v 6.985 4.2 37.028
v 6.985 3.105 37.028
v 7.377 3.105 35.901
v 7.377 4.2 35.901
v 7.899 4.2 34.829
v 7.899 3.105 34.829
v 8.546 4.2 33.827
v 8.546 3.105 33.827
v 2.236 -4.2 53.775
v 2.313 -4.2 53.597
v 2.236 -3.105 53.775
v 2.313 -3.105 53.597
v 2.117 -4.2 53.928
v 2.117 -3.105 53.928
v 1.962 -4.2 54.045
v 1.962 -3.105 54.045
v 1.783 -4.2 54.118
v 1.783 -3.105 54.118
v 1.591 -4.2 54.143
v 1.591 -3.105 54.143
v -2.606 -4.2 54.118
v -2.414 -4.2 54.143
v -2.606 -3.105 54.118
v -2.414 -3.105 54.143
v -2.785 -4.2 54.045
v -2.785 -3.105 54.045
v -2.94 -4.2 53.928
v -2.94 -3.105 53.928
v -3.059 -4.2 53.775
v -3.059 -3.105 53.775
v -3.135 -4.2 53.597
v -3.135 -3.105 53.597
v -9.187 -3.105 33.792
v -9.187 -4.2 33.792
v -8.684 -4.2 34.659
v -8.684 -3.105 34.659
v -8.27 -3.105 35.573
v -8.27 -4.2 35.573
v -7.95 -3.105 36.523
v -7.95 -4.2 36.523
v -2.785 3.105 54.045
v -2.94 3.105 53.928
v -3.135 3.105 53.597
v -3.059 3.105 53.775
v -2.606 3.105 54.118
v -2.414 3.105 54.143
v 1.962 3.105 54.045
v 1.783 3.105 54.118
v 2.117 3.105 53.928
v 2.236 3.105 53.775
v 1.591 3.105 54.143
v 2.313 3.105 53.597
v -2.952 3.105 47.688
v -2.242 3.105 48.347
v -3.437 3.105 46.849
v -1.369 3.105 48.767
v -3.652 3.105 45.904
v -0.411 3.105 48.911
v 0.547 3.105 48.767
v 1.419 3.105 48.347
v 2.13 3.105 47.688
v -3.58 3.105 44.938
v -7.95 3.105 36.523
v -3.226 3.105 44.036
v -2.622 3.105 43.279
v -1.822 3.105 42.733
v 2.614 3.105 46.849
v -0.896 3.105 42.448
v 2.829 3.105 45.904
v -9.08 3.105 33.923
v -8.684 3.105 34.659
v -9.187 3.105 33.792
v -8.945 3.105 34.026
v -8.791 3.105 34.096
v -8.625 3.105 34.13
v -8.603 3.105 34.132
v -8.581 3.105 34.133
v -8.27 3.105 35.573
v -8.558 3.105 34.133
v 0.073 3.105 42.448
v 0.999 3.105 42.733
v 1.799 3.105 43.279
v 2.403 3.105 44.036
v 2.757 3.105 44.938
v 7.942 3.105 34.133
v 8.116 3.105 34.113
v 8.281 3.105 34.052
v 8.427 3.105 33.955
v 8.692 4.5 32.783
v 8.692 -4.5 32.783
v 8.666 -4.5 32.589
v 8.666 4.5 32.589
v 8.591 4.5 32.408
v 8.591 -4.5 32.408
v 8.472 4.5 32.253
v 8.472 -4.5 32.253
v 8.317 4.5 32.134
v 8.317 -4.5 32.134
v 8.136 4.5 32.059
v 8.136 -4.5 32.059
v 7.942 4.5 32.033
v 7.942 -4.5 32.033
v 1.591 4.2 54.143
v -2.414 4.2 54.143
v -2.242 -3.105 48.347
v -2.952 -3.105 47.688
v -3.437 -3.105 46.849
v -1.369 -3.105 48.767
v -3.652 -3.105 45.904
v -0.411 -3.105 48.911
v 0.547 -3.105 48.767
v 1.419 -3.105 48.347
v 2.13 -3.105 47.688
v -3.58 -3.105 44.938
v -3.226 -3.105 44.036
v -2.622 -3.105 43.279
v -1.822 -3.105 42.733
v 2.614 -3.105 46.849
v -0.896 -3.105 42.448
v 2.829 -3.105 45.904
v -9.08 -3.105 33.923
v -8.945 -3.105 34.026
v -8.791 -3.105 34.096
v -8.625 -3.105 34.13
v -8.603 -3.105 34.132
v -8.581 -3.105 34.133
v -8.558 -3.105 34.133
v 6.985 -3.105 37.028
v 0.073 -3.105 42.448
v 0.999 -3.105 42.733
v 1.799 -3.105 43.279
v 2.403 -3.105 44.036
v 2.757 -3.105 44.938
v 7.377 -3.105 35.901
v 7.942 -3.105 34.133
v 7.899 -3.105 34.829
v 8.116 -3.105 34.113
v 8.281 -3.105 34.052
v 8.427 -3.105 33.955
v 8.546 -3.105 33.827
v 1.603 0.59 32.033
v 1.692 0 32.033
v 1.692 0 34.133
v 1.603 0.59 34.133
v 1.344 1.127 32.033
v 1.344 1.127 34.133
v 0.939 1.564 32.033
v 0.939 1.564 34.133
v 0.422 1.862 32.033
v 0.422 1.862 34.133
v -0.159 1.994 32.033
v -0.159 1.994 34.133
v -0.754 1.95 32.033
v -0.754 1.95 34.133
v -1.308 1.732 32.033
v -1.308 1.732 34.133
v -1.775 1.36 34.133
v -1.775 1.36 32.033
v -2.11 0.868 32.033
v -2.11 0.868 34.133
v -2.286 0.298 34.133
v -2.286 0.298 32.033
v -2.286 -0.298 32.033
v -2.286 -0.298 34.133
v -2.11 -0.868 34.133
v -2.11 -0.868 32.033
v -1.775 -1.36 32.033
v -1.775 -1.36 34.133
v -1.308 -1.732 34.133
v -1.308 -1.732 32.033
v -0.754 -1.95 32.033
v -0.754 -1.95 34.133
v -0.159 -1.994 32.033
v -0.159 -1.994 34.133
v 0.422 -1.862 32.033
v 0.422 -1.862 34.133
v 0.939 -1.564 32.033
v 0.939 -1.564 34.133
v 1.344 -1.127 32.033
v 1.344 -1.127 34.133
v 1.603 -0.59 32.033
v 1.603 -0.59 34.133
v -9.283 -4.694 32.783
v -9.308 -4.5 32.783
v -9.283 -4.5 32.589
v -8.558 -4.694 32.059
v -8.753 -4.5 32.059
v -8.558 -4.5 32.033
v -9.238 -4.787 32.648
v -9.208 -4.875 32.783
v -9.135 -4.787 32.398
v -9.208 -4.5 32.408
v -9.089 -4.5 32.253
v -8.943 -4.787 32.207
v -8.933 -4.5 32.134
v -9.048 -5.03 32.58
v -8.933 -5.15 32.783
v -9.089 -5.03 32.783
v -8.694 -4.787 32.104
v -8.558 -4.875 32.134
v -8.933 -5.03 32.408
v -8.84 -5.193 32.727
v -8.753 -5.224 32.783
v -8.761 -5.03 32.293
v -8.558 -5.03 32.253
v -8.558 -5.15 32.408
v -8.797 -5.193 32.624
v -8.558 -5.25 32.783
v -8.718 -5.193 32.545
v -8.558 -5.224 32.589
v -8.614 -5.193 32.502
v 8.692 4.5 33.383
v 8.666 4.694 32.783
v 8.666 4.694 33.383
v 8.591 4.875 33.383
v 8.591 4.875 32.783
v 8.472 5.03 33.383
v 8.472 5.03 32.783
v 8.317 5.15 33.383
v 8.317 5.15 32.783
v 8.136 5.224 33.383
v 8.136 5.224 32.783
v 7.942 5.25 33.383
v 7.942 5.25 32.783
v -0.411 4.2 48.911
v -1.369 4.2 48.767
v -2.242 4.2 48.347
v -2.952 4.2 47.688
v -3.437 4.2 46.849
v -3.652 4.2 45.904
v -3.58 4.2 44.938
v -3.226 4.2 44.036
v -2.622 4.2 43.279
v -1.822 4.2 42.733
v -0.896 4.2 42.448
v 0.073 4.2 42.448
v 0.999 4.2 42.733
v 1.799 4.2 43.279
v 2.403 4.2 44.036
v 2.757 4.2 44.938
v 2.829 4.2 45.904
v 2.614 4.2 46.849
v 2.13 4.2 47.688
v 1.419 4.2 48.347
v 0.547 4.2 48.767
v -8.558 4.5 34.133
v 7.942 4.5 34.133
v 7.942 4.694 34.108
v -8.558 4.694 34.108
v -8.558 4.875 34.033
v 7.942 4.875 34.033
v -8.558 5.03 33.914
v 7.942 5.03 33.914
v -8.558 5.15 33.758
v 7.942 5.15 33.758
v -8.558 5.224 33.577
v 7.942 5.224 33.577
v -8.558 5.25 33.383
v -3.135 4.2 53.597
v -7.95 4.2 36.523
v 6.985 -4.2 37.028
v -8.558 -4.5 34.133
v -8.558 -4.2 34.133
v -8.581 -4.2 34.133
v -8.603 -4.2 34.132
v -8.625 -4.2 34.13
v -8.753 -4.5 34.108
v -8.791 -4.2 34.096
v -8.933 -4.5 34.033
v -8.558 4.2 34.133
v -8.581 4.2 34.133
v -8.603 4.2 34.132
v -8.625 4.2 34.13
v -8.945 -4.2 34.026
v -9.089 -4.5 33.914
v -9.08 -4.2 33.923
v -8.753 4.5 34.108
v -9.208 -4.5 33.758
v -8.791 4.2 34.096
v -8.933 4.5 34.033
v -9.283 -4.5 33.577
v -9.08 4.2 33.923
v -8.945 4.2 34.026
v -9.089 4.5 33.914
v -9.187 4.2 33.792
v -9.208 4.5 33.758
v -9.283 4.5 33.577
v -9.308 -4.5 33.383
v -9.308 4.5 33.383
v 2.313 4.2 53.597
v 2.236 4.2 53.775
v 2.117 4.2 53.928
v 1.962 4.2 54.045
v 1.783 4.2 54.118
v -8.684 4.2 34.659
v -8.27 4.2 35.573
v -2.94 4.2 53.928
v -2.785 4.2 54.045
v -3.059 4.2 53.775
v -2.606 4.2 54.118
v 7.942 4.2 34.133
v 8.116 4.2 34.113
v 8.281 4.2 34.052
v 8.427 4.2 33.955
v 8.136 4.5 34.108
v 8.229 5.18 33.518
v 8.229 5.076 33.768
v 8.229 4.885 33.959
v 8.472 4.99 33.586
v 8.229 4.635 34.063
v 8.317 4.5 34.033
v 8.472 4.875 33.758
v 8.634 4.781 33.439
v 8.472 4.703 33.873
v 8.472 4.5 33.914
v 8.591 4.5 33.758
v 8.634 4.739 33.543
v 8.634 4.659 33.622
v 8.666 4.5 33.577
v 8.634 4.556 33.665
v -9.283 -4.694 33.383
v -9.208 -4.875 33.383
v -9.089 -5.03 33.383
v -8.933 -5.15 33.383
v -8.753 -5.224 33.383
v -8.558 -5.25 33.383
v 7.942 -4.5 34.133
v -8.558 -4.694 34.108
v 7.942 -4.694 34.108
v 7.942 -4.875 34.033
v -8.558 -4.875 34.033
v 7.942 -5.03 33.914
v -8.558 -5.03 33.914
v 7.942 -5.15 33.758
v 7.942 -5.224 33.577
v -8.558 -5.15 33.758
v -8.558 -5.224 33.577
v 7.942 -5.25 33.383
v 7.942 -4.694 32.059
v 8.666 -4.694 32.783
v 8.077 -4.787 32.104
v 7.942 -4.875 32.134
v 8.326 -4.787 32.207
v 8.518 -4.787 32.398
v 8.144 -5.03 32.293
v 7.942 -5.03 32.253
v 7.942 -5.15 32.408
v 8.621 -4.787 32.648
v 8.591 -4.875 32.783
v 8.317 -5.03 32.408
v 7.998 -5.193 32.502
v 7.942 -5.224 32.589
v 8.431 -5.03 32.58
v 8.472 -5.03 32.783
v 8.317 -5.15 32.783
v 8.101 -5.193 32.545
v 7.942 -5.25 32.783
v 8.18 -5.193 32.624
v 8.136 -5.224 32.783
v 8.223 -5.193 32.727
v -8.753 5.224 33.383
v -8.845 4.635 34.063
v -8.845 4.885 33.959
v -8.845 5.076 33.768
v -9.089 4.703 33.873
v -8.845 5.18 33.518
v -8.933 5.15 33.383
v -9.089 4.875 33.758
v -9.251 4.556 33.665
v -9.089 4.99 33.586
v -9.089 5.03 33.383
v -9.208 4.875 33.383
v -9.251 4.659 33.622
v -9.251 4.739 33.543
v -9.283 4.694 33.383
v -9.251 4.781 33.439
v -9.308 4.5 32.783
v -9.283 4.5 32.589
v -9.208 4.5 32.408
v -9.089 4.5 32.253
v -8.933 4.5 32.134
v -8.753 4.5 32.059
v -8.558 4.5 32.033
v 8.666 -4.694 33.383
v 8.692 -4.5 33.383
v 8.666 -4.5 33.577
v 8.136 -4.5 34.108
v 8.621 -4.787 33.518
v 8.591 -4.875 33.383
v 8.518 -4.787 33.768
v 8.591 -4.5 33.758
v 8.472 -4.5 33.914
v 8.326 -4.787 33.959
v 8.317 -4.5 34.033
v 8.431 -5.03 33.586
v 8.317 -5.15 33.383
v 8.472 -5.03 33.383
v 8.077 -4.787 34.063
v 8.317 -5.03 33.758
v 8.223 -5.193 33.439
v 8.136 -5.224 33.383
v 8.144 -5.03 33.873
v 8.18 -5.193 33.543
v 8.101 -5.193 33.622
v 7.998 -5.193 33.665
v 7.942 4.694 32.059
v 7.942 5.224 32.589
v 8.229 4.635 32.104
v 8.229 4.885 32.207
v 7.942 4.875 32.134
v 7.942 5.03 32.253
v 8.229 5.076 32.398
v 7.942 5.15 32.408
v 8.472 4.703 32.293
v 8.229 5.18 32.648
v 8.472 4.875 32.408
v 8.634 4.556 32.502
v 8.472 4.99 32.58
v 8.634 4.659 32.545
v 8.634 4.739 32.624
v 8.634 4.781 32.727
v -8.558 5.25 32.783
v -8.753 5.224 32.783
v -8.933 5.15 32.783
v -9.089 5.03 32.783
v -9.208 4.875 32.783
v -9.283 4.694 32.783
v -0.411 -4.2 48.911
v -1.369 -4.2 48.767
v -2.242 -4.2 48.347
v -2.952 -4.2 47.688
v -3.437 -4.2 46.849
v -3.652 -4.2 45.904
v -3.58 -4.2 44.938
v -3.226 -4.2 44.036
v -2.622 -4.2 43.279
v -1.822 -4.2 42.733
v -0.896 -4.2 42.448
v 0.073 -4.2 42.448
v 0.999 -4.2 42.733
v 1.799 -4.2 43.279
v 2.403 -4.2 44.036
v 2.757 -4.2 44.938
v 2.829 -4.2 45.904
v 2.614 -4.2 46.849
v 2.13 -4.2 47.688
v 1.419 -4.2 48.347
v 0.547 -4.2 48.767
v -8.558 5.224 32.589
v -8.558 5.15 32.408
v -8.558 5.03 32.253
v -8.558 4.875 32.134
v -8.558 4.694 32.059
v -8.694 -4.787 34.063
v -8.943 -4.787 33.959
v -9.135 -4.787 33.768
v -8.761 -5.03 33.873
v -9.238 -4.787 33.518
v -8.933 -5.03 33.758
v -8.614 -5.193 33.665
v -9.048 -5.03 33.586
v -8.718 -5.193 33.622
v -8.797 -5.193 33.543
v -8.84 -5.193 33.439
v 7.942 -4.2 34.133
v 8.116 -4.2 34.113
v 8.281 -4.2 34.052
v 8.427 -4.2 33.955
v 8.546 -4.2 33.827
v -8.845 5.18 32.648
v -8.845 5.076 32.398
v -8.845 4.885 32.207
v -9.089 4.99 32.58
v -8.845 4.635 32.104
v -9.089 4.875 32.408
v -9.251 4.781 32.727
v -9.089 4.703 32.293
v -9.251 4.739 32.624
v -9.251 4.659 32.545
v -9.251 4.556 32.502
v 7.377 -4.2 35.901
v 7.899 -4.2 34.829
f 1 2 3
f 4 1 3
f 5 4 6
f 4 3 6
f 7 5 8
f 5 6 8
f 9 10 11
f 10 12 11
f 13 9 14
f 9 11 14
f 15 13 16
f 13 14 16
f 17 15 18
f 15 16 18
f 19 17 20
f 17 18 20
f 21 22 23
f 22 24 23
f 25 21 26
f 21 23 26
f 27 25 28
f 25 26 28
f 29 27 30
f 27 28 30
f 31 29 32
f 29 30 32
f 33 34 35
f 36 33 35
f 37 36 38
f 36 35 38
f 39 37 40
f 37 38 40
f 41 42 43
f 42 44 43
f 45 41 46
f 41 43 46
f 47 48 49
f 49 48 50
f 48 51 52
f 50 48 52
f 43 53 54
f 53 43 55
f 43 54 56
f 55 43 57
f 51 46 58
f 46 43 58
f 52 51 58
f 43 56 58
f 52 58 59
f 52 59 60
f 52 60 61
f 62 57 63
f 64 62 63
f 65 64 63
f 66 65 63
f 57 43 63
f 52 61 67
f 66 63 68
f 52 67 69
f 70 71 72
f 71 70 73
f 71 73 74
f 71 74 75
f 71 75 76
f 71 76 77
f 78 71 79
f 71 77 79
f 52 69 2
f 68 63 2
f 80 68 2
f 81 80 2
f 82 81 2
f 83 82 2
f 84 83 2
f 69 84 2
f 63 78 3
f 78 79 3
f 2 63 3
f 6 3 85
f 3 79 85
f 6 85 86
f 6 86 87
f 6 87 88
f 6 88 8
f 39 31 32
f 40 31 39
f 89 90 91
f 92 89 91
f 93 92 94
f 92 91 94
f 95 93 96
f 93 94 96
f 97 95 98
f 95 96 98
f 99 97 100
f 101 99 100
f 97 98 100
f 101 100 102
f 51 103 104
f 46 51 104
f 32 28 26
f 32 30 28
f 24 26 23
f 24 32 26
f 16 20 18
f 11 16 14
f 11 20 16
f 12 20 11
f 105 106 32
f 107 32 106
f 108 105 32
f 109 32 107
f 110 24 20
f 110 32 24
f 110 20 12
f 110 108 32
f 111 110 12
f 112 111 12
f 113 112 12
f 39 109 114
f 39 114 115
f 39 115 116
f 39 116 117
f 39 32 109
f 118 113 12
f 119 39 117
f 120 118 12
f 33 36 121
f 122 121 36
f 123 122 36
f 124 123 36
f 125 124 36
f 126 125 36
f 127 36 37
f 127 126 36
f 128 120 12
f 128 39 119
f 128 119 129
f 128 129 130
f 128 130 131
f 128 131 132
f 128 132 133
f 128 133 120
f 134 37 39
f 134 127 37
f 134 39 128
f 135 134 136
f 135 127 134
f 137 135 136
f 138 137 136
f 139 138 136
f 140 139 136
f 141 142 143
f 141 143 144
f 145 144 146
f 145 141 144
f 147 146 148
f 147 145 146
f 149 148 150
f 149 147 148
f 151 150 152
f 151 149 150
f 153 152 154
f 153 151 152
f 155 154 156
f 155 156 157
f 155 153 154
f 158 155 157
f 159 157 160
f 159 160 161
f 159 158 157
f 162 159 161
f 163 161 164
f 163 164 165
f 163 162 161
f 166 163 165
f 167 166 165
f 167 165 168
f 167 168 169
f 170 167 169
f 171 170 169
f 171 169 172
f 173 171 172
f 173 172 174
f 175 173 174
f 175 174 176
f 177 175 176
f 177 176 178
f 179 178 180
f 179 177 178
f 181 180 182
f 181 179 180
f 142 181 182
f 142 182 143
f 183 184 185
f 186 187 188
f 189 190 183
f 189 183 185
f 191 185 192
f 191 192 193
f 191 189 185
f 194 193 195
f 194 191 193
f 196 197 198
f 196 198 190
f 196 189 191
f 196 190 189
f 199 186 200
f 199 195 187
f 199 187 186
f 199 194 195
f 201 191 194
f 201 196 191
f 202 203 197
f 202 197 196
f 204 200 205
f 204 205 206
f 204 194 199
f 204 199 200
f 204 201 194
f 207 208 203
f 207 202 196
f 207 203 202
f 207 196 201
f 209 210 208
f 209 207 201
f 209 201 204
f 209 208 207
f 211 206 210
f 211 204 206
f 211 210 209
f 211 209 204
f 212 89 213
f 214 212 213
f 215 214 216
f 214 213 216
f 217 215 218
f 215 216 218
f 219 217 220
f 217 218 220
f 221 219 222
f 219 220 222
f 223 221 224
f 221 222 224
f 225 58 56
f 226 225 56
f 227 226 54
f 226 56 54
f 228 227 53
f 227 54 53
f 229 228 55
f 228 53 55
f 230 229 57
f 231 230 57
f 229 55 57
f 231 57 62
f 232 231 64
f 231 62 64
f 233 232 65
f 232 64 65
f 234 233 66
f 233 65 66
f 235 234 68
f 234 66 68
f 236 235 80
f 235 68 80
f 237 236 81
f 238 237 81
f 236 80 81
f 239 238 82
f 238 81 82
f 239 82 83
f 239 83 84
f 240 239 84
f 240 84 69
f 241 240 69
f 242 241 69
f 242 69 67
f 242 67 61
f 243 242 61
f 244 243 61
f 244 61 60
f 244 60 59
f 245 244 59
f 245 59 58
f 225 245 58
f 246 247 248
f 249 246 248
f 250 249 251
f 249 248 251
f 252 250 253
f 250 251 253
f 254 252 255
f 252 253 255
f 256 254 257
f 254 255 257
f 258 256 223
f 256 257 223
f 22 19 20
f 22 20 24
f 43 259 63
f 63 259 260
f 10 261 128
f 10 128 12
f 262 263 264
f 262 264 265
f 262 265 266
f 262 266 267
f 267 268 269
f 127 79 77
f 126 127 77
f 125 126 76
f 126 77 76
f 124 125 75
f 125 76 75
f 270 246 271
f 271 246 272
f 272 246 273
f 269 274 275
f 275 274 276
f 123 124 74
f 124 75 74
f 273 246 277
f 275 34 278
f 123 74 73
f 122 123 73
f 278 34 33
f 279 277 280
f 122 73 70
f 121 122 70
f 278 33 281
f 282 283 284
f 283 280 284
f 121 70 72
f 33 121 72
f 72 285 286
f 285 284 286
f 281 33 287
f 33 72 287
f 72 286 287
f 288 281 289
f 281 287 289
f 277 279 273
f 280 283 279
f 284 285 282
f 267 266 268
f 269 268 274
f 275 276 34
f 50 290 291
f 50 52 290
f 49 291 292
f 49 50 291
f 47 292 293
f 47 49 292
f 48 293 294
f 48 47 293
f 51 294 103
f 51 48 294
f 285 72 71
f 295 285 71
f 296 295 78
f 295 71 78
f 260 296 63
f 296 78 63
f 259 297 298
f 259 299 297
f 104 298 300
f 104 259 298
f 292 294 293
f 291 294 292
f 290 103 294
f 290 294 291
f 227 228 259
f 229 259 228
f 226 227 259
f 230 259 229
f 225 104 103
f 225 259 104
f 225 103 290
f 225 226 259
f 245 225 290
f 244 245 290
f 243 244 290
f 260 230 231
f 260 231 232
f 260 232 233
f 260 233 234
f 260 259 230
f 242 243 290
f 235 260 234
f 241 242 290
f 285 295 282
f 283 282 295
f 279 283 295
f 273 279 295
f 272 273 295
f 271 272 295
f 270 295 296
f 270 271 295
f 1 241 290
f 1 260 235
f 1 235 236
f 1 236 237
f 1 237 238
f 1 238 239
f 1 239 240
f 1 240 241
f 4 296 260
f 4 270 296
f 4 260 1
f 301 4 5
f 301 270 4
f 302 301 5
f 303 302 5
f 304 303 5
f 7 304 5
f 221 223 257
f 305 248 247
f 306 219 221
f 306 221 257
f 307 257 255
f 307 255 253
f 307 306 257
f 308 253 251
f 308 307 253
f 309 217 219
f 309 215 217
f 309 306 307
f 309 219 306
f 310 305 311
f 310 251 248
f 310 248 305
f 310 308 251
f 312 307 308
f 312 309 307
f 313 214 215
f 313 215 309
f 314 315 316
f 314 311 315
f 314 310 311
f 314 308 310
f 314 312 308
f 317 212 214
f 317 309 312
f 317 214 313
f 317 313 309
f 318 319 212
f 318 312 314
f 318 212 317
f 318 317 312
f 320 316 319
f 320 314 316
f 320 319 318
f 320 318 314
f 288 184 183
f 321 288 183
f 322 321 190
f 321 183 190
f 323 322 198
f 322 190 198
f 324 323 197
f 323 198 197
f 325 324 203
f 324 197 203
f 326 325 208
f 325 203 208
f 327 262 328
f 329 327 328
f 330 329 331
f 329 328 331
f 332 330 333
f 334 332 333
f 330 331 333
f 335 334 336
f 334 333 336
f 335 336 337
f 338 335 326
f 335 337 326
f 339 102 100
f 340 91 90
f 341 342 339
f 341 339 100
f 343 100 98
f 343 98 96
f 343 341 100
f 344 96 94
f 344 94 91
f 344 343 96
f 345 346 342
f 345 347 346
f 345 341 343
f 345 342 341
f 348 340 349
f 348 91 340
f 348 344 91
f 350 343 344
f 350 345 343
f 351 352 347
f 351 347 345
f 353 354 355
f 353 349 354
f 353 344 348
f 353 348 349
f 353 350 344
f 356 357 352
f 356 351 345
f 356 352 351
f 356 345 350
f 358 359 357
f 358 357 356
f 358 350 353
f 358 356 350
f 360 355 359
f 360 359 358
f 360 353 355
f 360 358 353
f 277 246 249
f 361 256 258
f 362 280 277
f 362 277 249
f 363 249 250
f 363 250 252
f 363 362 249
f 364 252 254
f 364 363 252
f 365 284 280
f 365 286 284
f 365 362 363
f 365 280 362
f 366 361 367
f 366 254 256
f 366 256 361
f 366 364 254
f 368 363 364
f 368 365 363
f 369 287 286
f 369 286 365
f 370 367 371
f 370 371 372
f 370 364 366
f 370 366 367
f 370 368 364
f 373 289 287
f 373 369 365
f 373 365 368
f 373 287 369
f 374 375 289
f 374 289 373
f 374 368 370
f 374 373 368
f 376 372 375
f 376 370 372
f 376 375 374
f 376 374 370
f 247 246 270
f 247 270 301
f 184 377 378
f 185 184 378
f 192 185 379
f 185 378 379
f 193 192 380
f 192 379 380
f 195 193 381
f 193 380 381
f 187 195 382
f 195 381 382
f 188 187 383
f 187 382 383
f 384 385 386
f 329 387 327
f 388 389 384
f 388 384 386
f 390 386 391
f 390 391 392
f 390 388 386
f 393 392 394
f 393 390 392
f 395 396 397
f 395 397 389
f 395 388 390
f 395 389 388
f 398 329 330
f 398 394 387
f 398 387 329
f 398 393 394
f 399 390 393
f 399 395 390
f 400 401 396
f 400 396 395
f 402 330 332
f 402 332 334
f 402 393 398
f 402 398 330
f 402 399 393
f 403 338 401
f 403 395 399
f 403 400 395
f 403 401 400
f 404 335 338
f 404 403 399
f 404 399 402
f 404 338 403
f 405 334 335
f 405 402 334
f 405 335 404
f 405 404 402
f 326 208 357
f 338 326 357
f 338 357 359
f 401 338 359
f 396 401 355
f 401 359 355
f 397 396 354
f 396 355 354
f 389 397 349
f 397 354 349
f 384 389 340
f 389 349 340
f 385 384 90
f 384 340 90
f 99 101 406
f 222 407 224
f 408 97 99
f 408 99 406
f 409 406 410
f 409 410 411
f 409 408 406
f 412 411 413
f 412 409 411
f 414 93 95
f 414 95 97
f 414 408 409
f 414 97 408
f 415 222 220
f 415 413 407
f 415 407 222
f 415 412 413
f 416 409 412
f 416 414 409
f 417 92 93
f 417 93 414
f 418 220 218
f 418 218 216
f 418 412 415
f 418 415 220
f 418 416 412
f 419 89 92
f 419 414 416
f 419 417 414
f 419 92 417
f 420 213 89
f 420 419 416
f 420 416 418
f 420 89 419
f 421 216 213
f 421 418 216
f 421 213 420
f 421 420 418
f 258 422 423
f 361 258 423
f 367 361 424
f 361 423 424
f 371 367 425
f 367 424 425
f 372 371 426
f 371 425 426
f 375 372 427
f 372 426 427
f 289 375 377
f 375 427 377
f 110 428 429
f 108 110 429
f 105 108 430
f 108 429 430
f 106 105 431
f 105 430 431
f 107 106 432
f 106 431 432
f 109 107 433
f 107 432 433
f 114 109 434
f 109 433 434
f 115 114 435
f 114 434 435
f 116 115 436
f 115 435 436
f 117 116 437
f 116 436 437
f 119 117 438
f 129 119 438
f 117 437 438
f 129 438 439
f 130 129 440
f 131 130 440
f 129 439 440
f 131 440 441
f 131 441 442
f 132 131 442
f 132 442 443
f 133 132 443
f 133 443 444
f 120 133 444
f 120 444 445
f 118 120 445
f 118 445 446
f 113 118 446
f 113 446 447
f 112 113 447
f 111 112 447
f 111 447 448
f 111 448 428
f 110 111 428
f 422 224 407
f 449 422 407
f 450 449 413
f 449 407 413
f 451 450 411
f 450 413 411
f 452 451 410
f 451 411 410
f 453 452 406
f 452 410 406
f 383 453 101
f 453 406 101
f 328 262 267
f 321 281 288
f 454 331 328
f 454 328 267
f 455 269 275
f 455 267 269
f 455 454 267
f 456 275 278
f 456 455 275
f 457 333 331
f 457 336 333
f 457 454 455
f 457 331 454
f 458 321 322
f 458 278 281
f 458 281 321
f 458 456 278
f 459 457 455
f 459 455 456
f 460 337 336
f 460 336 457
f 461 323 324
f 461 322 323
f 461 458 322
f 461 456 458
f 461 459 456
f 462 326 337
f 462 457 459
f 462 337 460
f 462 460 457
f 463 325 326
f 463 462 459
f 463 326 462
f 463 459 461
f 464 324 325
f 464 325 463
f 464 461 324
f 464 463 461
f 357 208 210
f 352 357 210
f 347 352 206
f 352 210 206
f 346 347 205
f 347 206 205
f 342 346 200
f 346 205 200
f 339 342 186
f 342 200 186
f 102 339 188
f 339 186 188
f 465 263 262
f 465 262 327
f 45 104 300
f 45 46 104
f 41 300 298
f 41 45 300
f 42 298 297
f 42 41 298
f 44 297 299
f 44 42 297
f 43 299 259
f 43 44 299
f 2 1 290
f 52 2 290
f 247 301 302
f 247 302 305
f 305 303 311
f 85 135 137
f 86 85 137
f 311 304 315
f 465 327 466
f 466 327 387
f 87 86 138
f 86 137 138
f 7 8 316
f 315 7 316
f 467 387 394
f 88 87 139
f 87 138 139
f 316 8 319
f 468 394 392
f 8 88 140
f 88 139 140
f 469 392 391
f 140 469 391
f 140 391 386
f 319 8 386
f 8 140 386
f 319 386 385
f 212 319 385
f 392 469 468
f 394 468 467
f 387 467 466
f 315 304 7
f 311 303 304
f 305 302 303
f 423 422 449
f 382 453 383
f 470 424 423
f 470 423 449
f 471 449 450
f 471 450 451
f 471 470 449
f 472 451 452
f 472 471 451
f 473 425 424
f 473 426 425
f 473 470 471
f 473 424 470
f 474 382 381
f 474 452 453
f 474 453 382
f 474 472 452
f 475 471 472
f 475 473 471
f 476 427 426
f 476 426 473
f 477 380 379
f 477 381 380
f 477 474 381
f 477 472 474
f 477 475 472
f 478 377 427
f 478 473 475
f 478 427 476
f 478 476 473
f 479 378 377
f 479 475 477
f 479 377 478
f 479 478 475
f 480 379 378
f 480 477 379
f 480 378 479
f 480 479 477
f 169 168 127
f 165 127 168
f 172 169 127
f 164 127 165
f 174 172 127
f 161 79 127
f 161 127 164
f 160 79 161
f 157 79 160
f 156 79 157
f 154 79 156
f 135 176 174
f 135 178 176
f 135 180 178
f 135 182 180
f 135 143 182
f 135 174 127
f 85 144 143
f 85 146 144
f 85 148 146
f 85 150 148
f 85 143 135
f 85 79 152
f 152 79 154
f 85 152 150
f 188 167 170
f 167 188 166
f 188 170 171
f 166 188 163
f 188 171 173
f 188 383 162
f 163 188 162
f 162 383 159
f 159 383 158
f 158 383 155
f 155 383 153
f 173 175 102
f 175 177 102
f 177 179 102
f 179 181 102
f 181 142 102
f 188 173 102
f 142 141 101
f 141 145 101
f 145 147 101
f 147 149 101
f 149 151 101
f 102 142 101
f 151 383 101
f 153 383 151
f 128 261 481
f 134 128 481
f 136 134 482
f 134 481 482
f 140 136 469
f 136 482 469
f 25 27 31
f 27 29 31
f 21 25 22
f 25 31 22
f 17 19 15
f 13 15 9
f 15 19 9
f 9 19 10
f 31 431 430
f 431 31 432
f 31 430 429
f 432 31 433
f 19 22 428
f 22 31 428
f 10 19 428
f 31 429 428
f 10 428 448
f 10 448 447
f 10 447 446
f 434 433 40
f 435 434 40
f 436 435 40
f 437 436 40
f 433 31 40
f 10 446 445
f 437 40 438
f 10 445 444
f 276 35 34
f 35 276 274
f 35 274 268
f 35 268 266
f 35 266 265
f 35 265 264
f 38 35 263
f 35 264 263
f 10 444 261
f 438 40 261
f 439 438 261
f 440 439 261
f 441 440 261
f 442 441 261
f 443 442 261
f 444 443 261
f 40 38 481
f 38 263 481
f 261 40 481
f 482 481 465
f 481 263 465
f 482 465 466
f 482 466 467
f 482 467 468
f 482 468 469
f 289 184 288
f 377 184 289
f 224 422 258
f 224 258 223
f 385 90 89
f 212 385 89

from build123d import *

# Parameters (mm, degrees)
SKETCH1_W           = 120
SKETCH1_H           = 70
SKETCH1_R           = 13.333333333
BOSS_EXTRUDE1_DEPTH = 14
BOSS_EXTRUDE2_DEPTH = 7.3
SKETCH4_R           = 21.666666667
CUT_EXTRUDE1_DEPTH  = 172.159351628
FILLET1_R           = 5
FILLET2_R           = 5
SCALE1_SCALE        = 0.15
FILLET3_START       = -4.2
FILLET3_DEPTH       = 1.095
FILLET3_START_2     = 3.105
FILLET3_2_DEPTH     = 1.095


with BuildPart() as part:
    # Sketch1 → Boss-Extrude1 (new body)
    with BuildSketch(Plane.XY):
        Rectangle(SKETCH1_W, SKETCH1_H)
        Circle(SKETCH1_R, mode=Mode.SUBTRACT)
    extrude(amount=BOSS_EXTRUDE1_DEPTH)

    # Sketch3 → Boss-Extrude2 (add)
    with BuildSketch(Plane(origin=(0, -28, 0), x_dir=(-1, 0, 0), z_dir=(0, -1, 0))):
        Polygon((55.436544165, -14), (-54.063561803, -14), (-16.446396869, -147.399198267), (17.819379231, -147.399198267), align=None)
    boss_extrude2 = extrude(amount=-BOSS_EXTRUDE2_DEPTH)

    # Mirror1: Boss-Extrude2 across plane
    add(boss_extrude2.mirror(Plane.ZX))

    # Sketch4 → Cut-Extrude1 (cut, through all)
    with BuildSketch(Plane.XZ.offset(28)):
        with Locations(Location((-0.686491181, 90.853024988, 0), (0, 0, 90))):
            Circle(SKETCH4_R)
    extrude(amount=-CUT_EXTRUDE1_DEPTH, mode=Mode.SUBTRACT)

    # Fillet1
    # the kernel refuses this fillet: 5 mm, written as the material it takes off along each edge
    with BuildSketch(Plane(origin=(-55, 30, 9), x_dir=(0, 0, 1), z_dir=(-1, 0, 0))) as fillet1_piece_1_section:
        Polygon((0, 0), (FILLET1_R * 1.02, 0), (FILLET1_R * 1.02, FILLET1_R * 1.02), (0, FILLET1_R * 1.02), align=None)
    fillet1_piece_1 = extrude(amount=FILLET1_R * 1.02, mode=Mode.PRIVATE)
    fillet1_piece_1 = fillet1_piece_1 - Plane(origin=(-55, 30, 9), x_dir=(0, -0.7071067811865475, -0.7071067811865475), z_dir=(-1, 0, 0)) * Sphere(FILLET1_R, mode=Mode.PRIVATE)
    add(fillet1_piece_1, mode=Mode.SUBTRACT)
    with BuildSketch(Plane(origin=(-55, -30, 9), x_dir=(-1, 0, 0), z_dir=(0, -1, 0))) as fillet1_piece_2_section:
        Polygon((0, 0), (FILLET1_R * 1.02, 0), (FILLET1_R * 1.02, -FILLET1_R * 1.02), (0, -FILLET1_R * 1.02), align=None)
    fillet1_piece_2 = extrude(amount=FILLET1_R * 1.02, mode=Mode.PRIVATE)
    fillet1_piece_2 = fillet1_piece_2 - Plane(origin=(-55, -30, 9), x_dir=(0.7071067811865475, 0, -0.7071067811865475), z_dir=(0, -1, 0)) * Sphere(FILLET1_R, mode=Mode.PRIVATE)
    add(fillet1_piece_2, mode=Mode.SUBTRACT)
    with BuildSketch(Plane(origin=(-55, 30, 5), x_dir=(0, 0, -1), z_dir=(-1, 0, 0))) as fillet1_piece_3_section:
        Polygon((0, 0), (FILLET1_R * 1.02, 0), (FILLET1_R * 1.02, -FILLET1_R * 1.02), (0, -FILLET1_R * 1.02), align=None)
    fillet1_piece_3 = extrude(amount=FILLET1_R * 1.02, mode=Mode.PRIVATE)
    fillet1_piece_3 = fillet1_piece_3 - Plane(origin=(-55, 30, 5), x_dir=(0, -0.7071067811865475, 0.7071067811865475), z_dir=(-1, 0, 0)) * Sphere(FILLET1_R, mode=Mode.PRIVATE)
    add(fillet1_piece_3, mode=Mode.SUBTRACT)
    with BuildSketch(Plane(origin=(-55, -30, 5), x_dir=(-1, 0, 0), z_dir=(0, -1, 0))) as fillet1_piece_4_section:
        Polygon((0, 0), (FILLET1_R * 1.02, 0), (FILLET1_R * 1.02, FILLET1_R * 1.02), (0, FILLET1_R * 1.02), align=None)
    fillet1_piece_4 = extrude(amount=FILLET1_R * 1.02, mode=Mode.PRIVATE)
    fillet1_piece_4 = fillet1_piece_4 - Plane(origin=(-55, -30, 5), x_dir=(0.7071067811865475, 0, 0.7071067811865475), z_dir=(0, -1, 0)) * Sphere(FILLET1_R, mode=Mode.PRIVATE)
    add(fillet1_piece_4, mode=Mode.SUBTRACT)
    with BuildSketch(Plane(origin=(55, 30, 9), x_dir=(0, 0, 1), z_dir=(1, 0, 0))) as fillet1_piece_5_section:
        Polygon((0, 0), (FILLET1_R * 1.02, 0), (FILLET1_R * 1.02, -FILLET1_R * 1.02), (0, -FILLET1_R * 1.02), align=None)
    fillet1_piece_5 = extrude(amount=FILLET1_R * 1.02, mode=Mode.PRIVATE)
    fillet1_piece_5 = fillet1_piece_5 - Plane(origin=(55, 30, 9), x_dir=(0, -0.7071067811865475, -0.7071067811865475), z_dir=(1, 0, 0)) * Sphere(FILLET1_R, mode=Mode.PRIVATE)
    add(fillet1_piece_5, mode=Mode.SUBTRACT)
    with BuildSketch(Plane(origin=(55, 30, 5), x_dir=(0, 0, -1), z_dir=(1, 0, 0))) as fillet1_piece_6_section:
        Polygon((0, 0), (FILLET1_R * 1.02, 0), (FILLET1_R * 1.02, FILLET1_R * 1.02), (0, FILLET1_R * 1.02), align=None)
    fillet1_piece_6 = extrude(amount=FILLET1_R * 1.02, mode=Mode.PRIVATE)
    fillet1_piece_6 = fillet1_piece_6 - Plane(origin=(55, 30, 5), x_dir=(0, -0.7071067811865475, 0.7071067811865475), z_dir=(1, 0, 0)) * Sphere(FILLET1_R, mode=Mode.PRIVATE)
    add(fillet1_piece_6, mode=Mode.SUBTRACT)
    with BuildSketch(Plane(origin=(55, -30, 9), x_dir=(1, 0, 0), z_dir=(0, -1, 0))) as fillet1_piece_7_section:
        Polygon((0, 0), (FILLET1_R * 1.02, 0), (FILLET1_R * 1.02, FILLET1_R * 1.02), (0, FILLET1_R * 1.02), align=None)
    fillet1_piece_7 = extrude(amount=FILLET1_R * 1.02, mode=Mode.PRIVATE)
    fillet1_piece_7 = fillet1_piece_7 - Plane(origin=(55, -30, 9), x_dir=(-0.7071067811865475, 0, -0.7071067811865475), z_dir=(0, -1, 0)) * Sphere(FILLET1_R, mode=Mode.PRIVATE)
    add(fillet1_piece_7, mode=Mode.SUBTRACT)
    with BuildSketch(Plane(origin=(55, -30, 5), x_dir=(1, 0, 0), z_dir=(0, -1, 0))) as fillet1_piece_8_section:
        Polygon((0, 0), (FILLET1_R * 1.02, 0), (FILLET1_R * 1.02, -FILLET1_R * 1.02), (0, -FILLET1_R * 1.02), align=None)
    fillet1_piece_8 = extrude(amount=FILLET1_R * 1.02, mode=Mode.PRIVATE)
    fillet1_piece_8 = fillet1_piece_8 - Plane(origin=(55, -30, 5), x_dir=(-0.7071067811865475, 0, 0.7071067811865475), z_dir=(0, -1, 0)) * Sphere(FILLET1_R, mode=Mode.PRIVATE)
    add(fillet1_piece_8, mode=Mode.SUBTRACT)
    with BuildSketch(Plane(origin=(-60, 30, 14), x_dir=(0, 0, -1), z_dir=(0, -1, 0))) as fillet1_piece_9_section:
        with BuildLine():
            CenterArc((FILLET1_R, FILLET1_R), FILLET1_R, 180, 90)
            Line((0, FILLET1_R), (0, 0))
            Line((0, 0), (FILLET1_R, 0))
        make_face()
    fillet1_piece_9 = extrude(amount=60, mode=Mode.PRIVATE)
    fillet1_piece_9 = split(fillet1_piece_9, bisect_by=Plane(origin=(-55.772691467, 30, 12.807943643), z_dir=(-0.9624652257513497, 0, 0.2714050279921198)), keep=Keep.TOP, mode=Mode.PRIVATE)
    add(fillet1_piece_9, mode=Mode.SUBTRACT)
    with BuildSketch(Plane(origin=(-60, 30, 14), x_dir=(0, 0, -1), z_dir=(0, -1, 0))) as fillet1_piece_10_section:
        with BuildLine():
            CenterArc((FILLET1_R, FILLET1_R), FILLET1_R, 180, 90)
            Line((0, FILLET1_R), (0, 0))
            Line((0, 0), (FILLET1_R, 0))
        make_face()
    fillet1_piece_10 = extrude(amount=60, mode=Mode.PRIVATE)
    fillet1_piece_10 = split(fillet1_piece_10, bisect_by=Plane(origin=(-60, 28, 14), z_dir=(0, 1, 0)), keep=Keep.TOP, mode=Mode.PRIVATE)
    add(fillet1_piece_10, mode=Mode.SUBTRACT)
    with BuildSketch(Plane(origin=(-60, 30, 14), x_dir=(0, 0, -1), z_dir=(0, -1, 0))) as fillet1_piece_11_section:
        with BuildLine():
            CenterArc((FILLET1_R, FILLET1_R), FILLET1_R, 180, 90)
            Line((0, FILLET1_R), (0, 0))
            Line((0, 0), (FILLET1_R, 0))
        make_face()
    fillet1_piece_11 = extrude(amount=60, mode=Mode.PRIVATE)
    fillet1_piece_11 = split(fillet1_piece_11, bisect_by=Plane(origin=(-60, -20.7, 14), z_dir=(0, 1, 0)), keep=Keep.TOP, mode=Mode.PRIVATE)
    fillet1_piece_11 = split(fillet1_piece_11, bisect_by=Plane(origin=(-60, 20.7, 14), z_dir=(0, -1, 0)), keep=Keep.TOP, mode=Mode.PRIVATE)
    add(fillet1_piece_11, mode=Mode.SUBTRACT)
    with BuildSketch(Plane(origin=(-60, 30, 14), x_dir=(0, 0, -1), z_dir=(0, -1, 0))) as fillet1_piece_12_section:
        with BuildLine():
            CenterArc((FILLET1_R, FILLET1_R), FILLET1_R, 180, 90)
            Line((0, FILLET1_R), (0, 0))
            Line((0, 0), (FILLET1_R, 0))
        make_face()
    fillet1_piece_12 = extrude(amount=60, mode=Mode.PRIVATE)
    fillet1_piece_12 = split(fillet1_piece_12, bisect_by=Plane(origin=(-60, -28, 14), z_dir=(0, -1, 0)), keep=Keep.TOP, mode=Mode.PRIVATE)
    add(fillet1_piece_12, mode=Mode.SUBTRACT)
    with BuildSketch(Plane(origin=(-60, 30, 0), x_dir=(0, 0, 1), z_dir=(0, -1, 0)), Plane(origin=(60, -30, 0), x_dir=(0, 0, 1), z_dir=(0, 1, 0))) as fillet1_piece_13:
        with BuildLine():
            CenterArc((FILLET1_R, -FILLET1_R), FILLET1_R, 90, 90)
            Line((0, -FILLET1_R), (0, 0))
            Line((0, 0), (FILLET1_R, 0))
        make_face()
    extrude(amount=60, mode=Mode.SUBTRACT)
    with BuildSketch(Plane(origin=(55, 35, 14), x_dir=(0, -1, 0), z_dir=(-1, 0, 0)), Plane(origin=(-55, -35, 0), x_dir=(0, 0, 1), z_dir=(1, 0, 0))) as fillet1_piece_14:
        with BuildLine():
            CenterArc((FILLET1_R, -FILLET1_R), FILLET1_R, 90, 90)
            Line((0, -FILLET1_R), (0, 0))
            Line((0, 0), (FILLET1_R, 0))
        make_face()
    extrude(amount=110, mode=Mode.SUBTRACT)
    with BuildSketch(Plane(origin=(-60, 35, 5), x_dir=(0, -1, 0), z_dir=(0, 0, 1)), Plane(origin=(-60, -35, 5), x_dir=(1, 0, 0), z_dir=(0, 0, 1))) as fillet1_piece_15:
        with BuildLine():
            CenterArc((FILLET1_R, FILLET1_R), FILLET1_R, 180, 90)
            Line((0, FILLET1_R), (0, 0))
            Line((0, 0), (FILLET1_R, 0))
        make_face()
    extrude(amount=4, mode=Mode.SUBTRACT)
    with BuildSketch(Plane(origin=(55, 35, 0), x_dir=(0, -1, 0), z_dir=(-1, 0, 0)), Plane(origin=(-55, -35, 14), x_dir=(0, 0, -1), z_dir=(1, 0, 0))) as fillet1_piece_16:
        with BuildLine():
            CenterArc((FILLET1_R, FILLET1_R), FILLET1_R, 180, 90)
            Line((0, FILLET1_R), (0, 0))
            Line((0, 0), (FILLET1_R, 0))
        make_face()
    extrude(amount=110, mode=Mode.SUBTRACT)
    with BuildSketch(Plane(origin=(60, -30, 14), x_dir=(0, 0, -1), z_dir=(0, 1, 0))) as fillet1_piece_17:
        with BuildLine():
            CenterArc((FILLET1_R, FILLET1_R), FILLET1_R, 180, 90)
            Line((0, FILLET1_R), (0, 0))
            Line((0, 0), (FILLET1_R, 0))
        make_face()
    extrude(amount=60, mode=Mode.SUBTRACT)
    with BuildSketch(Plane(origin=(60, 35, 5), x_dir=(0, -1, 0), z_dir=(0, 0, 1)), Plane(origin=(60, -35, 5), x_dir=(-1, 0, 0), z_dir=(0, 0, 1))) as fillet1_piece_18:
        with BuildLine():
            CenterArc((FILLET1_R, -FILLET1_R), FILLET1_R, 90, 90)
            Line((0, -FILLET1_R), (0, 0))
            Line((0, 0), (FILLET1_R, 0))
        make_face()
    extrude(amount=4, mode=Mode.SUBTRACT)

    # Fillet2
    fillet2_edges = [part.edges().sort_by_distance(p)[0] for p in [
        (-17.819379231, -24.35, 147.399198267),
        (16.446396869, -24.35, 147.399198267),
        (16.446396869, 24.35, 147.399198267),
        (-17.819379231, 24.35, 147.399198267),
    ]]
    fillet(fillet2_edges, radius=FILLET2_R)


with BuildPart() as part_1:
    # Scale1: scaled about (-0.362902499, 0, 37.686238577)
    add(part.part.scale(SCALE1_SCALE).moved(Location((-0.308467124, 0, 32.03330279))))

    # Fillet3: read off the stored shape, not the designer's step
    # Fillet3 outline → Fillet3 (add)
    with BuildSketch(Plane(origin=(0, 0, 0), x_dir=(1, 0, 0), z_dir=(0, 1, 0)).offset(FILLET3_START)):
        with BuildLine():
            ThreePointArc((-8.624776975, -34.130365708), (-8.945174574, -34.025920365), (-9.187499582, -33.791736588))
            ThreePointArc((-9.187499582, -33.791736588), (-8.465735644, -35.11094716), (-7.949946764, -36.523470273))
            Line((-7.949946764, -36.523470273), (-8.624776975, -34.130365708))
        make_face()
        with BuildLine():
            Line((7.941532876, -34.13330279), (7.801067146, -34.13330279))
            Line((7.801067146, -34.13330279), (6.984932745, -37.027504812))
            ThreePointArc((6.984932745, -37.027504812), (7.621987061, -35.357141421), (8.546280698, -33.826901788))
            ThreePointArc((8.546280698, -33.826901788), (8.280502455, -34.052331656), (7.941532876, -34.13330279))
        make_face()
    extrude(amount=FILLET3_DEPTH)

    # Fillet3 2 outline → Fillet3 2 (add)
    with BuildSketch(Plane(origin=(0, 0, 0), x_dir=(1, 0, 0), z_dir=(0, 1, 0)).offset(FILLET3_START_2)):
        with BuildLine():
            ThreePointArc((-8.624776975, -34.130365708), (-8.945174574, -34.025920365), (-9.187499582, -33.791736588))
            ThreePointArc((-9.187499582, -33.791736588), (-8.465735644, -35.11094716), (-7.949946764, -36.523470273))
            Line((-7.949946764, -36.523470273), (-8.624776975, -34.130365708))
        make_face()
        with BuildLine():
            Line((7.941532876, -34.13330279), (7.801067146, -34.13330279))
            Line((7.801067146, -34.13330279), (6.984932745, -37.027504812))
            ThreePointArc((6.984932745, -37.027504812), (7.621987061, -35.357141421), (8.546280698, -33.826901788))
            ThreePointArc((8.546280698, -33.826901788), (8.280502455, -34.052331656), (7.941532876, -34.13330279))
        make_face()
    extrude(amount=FILLET3_2_DEPTH)


solid = part_1.part
